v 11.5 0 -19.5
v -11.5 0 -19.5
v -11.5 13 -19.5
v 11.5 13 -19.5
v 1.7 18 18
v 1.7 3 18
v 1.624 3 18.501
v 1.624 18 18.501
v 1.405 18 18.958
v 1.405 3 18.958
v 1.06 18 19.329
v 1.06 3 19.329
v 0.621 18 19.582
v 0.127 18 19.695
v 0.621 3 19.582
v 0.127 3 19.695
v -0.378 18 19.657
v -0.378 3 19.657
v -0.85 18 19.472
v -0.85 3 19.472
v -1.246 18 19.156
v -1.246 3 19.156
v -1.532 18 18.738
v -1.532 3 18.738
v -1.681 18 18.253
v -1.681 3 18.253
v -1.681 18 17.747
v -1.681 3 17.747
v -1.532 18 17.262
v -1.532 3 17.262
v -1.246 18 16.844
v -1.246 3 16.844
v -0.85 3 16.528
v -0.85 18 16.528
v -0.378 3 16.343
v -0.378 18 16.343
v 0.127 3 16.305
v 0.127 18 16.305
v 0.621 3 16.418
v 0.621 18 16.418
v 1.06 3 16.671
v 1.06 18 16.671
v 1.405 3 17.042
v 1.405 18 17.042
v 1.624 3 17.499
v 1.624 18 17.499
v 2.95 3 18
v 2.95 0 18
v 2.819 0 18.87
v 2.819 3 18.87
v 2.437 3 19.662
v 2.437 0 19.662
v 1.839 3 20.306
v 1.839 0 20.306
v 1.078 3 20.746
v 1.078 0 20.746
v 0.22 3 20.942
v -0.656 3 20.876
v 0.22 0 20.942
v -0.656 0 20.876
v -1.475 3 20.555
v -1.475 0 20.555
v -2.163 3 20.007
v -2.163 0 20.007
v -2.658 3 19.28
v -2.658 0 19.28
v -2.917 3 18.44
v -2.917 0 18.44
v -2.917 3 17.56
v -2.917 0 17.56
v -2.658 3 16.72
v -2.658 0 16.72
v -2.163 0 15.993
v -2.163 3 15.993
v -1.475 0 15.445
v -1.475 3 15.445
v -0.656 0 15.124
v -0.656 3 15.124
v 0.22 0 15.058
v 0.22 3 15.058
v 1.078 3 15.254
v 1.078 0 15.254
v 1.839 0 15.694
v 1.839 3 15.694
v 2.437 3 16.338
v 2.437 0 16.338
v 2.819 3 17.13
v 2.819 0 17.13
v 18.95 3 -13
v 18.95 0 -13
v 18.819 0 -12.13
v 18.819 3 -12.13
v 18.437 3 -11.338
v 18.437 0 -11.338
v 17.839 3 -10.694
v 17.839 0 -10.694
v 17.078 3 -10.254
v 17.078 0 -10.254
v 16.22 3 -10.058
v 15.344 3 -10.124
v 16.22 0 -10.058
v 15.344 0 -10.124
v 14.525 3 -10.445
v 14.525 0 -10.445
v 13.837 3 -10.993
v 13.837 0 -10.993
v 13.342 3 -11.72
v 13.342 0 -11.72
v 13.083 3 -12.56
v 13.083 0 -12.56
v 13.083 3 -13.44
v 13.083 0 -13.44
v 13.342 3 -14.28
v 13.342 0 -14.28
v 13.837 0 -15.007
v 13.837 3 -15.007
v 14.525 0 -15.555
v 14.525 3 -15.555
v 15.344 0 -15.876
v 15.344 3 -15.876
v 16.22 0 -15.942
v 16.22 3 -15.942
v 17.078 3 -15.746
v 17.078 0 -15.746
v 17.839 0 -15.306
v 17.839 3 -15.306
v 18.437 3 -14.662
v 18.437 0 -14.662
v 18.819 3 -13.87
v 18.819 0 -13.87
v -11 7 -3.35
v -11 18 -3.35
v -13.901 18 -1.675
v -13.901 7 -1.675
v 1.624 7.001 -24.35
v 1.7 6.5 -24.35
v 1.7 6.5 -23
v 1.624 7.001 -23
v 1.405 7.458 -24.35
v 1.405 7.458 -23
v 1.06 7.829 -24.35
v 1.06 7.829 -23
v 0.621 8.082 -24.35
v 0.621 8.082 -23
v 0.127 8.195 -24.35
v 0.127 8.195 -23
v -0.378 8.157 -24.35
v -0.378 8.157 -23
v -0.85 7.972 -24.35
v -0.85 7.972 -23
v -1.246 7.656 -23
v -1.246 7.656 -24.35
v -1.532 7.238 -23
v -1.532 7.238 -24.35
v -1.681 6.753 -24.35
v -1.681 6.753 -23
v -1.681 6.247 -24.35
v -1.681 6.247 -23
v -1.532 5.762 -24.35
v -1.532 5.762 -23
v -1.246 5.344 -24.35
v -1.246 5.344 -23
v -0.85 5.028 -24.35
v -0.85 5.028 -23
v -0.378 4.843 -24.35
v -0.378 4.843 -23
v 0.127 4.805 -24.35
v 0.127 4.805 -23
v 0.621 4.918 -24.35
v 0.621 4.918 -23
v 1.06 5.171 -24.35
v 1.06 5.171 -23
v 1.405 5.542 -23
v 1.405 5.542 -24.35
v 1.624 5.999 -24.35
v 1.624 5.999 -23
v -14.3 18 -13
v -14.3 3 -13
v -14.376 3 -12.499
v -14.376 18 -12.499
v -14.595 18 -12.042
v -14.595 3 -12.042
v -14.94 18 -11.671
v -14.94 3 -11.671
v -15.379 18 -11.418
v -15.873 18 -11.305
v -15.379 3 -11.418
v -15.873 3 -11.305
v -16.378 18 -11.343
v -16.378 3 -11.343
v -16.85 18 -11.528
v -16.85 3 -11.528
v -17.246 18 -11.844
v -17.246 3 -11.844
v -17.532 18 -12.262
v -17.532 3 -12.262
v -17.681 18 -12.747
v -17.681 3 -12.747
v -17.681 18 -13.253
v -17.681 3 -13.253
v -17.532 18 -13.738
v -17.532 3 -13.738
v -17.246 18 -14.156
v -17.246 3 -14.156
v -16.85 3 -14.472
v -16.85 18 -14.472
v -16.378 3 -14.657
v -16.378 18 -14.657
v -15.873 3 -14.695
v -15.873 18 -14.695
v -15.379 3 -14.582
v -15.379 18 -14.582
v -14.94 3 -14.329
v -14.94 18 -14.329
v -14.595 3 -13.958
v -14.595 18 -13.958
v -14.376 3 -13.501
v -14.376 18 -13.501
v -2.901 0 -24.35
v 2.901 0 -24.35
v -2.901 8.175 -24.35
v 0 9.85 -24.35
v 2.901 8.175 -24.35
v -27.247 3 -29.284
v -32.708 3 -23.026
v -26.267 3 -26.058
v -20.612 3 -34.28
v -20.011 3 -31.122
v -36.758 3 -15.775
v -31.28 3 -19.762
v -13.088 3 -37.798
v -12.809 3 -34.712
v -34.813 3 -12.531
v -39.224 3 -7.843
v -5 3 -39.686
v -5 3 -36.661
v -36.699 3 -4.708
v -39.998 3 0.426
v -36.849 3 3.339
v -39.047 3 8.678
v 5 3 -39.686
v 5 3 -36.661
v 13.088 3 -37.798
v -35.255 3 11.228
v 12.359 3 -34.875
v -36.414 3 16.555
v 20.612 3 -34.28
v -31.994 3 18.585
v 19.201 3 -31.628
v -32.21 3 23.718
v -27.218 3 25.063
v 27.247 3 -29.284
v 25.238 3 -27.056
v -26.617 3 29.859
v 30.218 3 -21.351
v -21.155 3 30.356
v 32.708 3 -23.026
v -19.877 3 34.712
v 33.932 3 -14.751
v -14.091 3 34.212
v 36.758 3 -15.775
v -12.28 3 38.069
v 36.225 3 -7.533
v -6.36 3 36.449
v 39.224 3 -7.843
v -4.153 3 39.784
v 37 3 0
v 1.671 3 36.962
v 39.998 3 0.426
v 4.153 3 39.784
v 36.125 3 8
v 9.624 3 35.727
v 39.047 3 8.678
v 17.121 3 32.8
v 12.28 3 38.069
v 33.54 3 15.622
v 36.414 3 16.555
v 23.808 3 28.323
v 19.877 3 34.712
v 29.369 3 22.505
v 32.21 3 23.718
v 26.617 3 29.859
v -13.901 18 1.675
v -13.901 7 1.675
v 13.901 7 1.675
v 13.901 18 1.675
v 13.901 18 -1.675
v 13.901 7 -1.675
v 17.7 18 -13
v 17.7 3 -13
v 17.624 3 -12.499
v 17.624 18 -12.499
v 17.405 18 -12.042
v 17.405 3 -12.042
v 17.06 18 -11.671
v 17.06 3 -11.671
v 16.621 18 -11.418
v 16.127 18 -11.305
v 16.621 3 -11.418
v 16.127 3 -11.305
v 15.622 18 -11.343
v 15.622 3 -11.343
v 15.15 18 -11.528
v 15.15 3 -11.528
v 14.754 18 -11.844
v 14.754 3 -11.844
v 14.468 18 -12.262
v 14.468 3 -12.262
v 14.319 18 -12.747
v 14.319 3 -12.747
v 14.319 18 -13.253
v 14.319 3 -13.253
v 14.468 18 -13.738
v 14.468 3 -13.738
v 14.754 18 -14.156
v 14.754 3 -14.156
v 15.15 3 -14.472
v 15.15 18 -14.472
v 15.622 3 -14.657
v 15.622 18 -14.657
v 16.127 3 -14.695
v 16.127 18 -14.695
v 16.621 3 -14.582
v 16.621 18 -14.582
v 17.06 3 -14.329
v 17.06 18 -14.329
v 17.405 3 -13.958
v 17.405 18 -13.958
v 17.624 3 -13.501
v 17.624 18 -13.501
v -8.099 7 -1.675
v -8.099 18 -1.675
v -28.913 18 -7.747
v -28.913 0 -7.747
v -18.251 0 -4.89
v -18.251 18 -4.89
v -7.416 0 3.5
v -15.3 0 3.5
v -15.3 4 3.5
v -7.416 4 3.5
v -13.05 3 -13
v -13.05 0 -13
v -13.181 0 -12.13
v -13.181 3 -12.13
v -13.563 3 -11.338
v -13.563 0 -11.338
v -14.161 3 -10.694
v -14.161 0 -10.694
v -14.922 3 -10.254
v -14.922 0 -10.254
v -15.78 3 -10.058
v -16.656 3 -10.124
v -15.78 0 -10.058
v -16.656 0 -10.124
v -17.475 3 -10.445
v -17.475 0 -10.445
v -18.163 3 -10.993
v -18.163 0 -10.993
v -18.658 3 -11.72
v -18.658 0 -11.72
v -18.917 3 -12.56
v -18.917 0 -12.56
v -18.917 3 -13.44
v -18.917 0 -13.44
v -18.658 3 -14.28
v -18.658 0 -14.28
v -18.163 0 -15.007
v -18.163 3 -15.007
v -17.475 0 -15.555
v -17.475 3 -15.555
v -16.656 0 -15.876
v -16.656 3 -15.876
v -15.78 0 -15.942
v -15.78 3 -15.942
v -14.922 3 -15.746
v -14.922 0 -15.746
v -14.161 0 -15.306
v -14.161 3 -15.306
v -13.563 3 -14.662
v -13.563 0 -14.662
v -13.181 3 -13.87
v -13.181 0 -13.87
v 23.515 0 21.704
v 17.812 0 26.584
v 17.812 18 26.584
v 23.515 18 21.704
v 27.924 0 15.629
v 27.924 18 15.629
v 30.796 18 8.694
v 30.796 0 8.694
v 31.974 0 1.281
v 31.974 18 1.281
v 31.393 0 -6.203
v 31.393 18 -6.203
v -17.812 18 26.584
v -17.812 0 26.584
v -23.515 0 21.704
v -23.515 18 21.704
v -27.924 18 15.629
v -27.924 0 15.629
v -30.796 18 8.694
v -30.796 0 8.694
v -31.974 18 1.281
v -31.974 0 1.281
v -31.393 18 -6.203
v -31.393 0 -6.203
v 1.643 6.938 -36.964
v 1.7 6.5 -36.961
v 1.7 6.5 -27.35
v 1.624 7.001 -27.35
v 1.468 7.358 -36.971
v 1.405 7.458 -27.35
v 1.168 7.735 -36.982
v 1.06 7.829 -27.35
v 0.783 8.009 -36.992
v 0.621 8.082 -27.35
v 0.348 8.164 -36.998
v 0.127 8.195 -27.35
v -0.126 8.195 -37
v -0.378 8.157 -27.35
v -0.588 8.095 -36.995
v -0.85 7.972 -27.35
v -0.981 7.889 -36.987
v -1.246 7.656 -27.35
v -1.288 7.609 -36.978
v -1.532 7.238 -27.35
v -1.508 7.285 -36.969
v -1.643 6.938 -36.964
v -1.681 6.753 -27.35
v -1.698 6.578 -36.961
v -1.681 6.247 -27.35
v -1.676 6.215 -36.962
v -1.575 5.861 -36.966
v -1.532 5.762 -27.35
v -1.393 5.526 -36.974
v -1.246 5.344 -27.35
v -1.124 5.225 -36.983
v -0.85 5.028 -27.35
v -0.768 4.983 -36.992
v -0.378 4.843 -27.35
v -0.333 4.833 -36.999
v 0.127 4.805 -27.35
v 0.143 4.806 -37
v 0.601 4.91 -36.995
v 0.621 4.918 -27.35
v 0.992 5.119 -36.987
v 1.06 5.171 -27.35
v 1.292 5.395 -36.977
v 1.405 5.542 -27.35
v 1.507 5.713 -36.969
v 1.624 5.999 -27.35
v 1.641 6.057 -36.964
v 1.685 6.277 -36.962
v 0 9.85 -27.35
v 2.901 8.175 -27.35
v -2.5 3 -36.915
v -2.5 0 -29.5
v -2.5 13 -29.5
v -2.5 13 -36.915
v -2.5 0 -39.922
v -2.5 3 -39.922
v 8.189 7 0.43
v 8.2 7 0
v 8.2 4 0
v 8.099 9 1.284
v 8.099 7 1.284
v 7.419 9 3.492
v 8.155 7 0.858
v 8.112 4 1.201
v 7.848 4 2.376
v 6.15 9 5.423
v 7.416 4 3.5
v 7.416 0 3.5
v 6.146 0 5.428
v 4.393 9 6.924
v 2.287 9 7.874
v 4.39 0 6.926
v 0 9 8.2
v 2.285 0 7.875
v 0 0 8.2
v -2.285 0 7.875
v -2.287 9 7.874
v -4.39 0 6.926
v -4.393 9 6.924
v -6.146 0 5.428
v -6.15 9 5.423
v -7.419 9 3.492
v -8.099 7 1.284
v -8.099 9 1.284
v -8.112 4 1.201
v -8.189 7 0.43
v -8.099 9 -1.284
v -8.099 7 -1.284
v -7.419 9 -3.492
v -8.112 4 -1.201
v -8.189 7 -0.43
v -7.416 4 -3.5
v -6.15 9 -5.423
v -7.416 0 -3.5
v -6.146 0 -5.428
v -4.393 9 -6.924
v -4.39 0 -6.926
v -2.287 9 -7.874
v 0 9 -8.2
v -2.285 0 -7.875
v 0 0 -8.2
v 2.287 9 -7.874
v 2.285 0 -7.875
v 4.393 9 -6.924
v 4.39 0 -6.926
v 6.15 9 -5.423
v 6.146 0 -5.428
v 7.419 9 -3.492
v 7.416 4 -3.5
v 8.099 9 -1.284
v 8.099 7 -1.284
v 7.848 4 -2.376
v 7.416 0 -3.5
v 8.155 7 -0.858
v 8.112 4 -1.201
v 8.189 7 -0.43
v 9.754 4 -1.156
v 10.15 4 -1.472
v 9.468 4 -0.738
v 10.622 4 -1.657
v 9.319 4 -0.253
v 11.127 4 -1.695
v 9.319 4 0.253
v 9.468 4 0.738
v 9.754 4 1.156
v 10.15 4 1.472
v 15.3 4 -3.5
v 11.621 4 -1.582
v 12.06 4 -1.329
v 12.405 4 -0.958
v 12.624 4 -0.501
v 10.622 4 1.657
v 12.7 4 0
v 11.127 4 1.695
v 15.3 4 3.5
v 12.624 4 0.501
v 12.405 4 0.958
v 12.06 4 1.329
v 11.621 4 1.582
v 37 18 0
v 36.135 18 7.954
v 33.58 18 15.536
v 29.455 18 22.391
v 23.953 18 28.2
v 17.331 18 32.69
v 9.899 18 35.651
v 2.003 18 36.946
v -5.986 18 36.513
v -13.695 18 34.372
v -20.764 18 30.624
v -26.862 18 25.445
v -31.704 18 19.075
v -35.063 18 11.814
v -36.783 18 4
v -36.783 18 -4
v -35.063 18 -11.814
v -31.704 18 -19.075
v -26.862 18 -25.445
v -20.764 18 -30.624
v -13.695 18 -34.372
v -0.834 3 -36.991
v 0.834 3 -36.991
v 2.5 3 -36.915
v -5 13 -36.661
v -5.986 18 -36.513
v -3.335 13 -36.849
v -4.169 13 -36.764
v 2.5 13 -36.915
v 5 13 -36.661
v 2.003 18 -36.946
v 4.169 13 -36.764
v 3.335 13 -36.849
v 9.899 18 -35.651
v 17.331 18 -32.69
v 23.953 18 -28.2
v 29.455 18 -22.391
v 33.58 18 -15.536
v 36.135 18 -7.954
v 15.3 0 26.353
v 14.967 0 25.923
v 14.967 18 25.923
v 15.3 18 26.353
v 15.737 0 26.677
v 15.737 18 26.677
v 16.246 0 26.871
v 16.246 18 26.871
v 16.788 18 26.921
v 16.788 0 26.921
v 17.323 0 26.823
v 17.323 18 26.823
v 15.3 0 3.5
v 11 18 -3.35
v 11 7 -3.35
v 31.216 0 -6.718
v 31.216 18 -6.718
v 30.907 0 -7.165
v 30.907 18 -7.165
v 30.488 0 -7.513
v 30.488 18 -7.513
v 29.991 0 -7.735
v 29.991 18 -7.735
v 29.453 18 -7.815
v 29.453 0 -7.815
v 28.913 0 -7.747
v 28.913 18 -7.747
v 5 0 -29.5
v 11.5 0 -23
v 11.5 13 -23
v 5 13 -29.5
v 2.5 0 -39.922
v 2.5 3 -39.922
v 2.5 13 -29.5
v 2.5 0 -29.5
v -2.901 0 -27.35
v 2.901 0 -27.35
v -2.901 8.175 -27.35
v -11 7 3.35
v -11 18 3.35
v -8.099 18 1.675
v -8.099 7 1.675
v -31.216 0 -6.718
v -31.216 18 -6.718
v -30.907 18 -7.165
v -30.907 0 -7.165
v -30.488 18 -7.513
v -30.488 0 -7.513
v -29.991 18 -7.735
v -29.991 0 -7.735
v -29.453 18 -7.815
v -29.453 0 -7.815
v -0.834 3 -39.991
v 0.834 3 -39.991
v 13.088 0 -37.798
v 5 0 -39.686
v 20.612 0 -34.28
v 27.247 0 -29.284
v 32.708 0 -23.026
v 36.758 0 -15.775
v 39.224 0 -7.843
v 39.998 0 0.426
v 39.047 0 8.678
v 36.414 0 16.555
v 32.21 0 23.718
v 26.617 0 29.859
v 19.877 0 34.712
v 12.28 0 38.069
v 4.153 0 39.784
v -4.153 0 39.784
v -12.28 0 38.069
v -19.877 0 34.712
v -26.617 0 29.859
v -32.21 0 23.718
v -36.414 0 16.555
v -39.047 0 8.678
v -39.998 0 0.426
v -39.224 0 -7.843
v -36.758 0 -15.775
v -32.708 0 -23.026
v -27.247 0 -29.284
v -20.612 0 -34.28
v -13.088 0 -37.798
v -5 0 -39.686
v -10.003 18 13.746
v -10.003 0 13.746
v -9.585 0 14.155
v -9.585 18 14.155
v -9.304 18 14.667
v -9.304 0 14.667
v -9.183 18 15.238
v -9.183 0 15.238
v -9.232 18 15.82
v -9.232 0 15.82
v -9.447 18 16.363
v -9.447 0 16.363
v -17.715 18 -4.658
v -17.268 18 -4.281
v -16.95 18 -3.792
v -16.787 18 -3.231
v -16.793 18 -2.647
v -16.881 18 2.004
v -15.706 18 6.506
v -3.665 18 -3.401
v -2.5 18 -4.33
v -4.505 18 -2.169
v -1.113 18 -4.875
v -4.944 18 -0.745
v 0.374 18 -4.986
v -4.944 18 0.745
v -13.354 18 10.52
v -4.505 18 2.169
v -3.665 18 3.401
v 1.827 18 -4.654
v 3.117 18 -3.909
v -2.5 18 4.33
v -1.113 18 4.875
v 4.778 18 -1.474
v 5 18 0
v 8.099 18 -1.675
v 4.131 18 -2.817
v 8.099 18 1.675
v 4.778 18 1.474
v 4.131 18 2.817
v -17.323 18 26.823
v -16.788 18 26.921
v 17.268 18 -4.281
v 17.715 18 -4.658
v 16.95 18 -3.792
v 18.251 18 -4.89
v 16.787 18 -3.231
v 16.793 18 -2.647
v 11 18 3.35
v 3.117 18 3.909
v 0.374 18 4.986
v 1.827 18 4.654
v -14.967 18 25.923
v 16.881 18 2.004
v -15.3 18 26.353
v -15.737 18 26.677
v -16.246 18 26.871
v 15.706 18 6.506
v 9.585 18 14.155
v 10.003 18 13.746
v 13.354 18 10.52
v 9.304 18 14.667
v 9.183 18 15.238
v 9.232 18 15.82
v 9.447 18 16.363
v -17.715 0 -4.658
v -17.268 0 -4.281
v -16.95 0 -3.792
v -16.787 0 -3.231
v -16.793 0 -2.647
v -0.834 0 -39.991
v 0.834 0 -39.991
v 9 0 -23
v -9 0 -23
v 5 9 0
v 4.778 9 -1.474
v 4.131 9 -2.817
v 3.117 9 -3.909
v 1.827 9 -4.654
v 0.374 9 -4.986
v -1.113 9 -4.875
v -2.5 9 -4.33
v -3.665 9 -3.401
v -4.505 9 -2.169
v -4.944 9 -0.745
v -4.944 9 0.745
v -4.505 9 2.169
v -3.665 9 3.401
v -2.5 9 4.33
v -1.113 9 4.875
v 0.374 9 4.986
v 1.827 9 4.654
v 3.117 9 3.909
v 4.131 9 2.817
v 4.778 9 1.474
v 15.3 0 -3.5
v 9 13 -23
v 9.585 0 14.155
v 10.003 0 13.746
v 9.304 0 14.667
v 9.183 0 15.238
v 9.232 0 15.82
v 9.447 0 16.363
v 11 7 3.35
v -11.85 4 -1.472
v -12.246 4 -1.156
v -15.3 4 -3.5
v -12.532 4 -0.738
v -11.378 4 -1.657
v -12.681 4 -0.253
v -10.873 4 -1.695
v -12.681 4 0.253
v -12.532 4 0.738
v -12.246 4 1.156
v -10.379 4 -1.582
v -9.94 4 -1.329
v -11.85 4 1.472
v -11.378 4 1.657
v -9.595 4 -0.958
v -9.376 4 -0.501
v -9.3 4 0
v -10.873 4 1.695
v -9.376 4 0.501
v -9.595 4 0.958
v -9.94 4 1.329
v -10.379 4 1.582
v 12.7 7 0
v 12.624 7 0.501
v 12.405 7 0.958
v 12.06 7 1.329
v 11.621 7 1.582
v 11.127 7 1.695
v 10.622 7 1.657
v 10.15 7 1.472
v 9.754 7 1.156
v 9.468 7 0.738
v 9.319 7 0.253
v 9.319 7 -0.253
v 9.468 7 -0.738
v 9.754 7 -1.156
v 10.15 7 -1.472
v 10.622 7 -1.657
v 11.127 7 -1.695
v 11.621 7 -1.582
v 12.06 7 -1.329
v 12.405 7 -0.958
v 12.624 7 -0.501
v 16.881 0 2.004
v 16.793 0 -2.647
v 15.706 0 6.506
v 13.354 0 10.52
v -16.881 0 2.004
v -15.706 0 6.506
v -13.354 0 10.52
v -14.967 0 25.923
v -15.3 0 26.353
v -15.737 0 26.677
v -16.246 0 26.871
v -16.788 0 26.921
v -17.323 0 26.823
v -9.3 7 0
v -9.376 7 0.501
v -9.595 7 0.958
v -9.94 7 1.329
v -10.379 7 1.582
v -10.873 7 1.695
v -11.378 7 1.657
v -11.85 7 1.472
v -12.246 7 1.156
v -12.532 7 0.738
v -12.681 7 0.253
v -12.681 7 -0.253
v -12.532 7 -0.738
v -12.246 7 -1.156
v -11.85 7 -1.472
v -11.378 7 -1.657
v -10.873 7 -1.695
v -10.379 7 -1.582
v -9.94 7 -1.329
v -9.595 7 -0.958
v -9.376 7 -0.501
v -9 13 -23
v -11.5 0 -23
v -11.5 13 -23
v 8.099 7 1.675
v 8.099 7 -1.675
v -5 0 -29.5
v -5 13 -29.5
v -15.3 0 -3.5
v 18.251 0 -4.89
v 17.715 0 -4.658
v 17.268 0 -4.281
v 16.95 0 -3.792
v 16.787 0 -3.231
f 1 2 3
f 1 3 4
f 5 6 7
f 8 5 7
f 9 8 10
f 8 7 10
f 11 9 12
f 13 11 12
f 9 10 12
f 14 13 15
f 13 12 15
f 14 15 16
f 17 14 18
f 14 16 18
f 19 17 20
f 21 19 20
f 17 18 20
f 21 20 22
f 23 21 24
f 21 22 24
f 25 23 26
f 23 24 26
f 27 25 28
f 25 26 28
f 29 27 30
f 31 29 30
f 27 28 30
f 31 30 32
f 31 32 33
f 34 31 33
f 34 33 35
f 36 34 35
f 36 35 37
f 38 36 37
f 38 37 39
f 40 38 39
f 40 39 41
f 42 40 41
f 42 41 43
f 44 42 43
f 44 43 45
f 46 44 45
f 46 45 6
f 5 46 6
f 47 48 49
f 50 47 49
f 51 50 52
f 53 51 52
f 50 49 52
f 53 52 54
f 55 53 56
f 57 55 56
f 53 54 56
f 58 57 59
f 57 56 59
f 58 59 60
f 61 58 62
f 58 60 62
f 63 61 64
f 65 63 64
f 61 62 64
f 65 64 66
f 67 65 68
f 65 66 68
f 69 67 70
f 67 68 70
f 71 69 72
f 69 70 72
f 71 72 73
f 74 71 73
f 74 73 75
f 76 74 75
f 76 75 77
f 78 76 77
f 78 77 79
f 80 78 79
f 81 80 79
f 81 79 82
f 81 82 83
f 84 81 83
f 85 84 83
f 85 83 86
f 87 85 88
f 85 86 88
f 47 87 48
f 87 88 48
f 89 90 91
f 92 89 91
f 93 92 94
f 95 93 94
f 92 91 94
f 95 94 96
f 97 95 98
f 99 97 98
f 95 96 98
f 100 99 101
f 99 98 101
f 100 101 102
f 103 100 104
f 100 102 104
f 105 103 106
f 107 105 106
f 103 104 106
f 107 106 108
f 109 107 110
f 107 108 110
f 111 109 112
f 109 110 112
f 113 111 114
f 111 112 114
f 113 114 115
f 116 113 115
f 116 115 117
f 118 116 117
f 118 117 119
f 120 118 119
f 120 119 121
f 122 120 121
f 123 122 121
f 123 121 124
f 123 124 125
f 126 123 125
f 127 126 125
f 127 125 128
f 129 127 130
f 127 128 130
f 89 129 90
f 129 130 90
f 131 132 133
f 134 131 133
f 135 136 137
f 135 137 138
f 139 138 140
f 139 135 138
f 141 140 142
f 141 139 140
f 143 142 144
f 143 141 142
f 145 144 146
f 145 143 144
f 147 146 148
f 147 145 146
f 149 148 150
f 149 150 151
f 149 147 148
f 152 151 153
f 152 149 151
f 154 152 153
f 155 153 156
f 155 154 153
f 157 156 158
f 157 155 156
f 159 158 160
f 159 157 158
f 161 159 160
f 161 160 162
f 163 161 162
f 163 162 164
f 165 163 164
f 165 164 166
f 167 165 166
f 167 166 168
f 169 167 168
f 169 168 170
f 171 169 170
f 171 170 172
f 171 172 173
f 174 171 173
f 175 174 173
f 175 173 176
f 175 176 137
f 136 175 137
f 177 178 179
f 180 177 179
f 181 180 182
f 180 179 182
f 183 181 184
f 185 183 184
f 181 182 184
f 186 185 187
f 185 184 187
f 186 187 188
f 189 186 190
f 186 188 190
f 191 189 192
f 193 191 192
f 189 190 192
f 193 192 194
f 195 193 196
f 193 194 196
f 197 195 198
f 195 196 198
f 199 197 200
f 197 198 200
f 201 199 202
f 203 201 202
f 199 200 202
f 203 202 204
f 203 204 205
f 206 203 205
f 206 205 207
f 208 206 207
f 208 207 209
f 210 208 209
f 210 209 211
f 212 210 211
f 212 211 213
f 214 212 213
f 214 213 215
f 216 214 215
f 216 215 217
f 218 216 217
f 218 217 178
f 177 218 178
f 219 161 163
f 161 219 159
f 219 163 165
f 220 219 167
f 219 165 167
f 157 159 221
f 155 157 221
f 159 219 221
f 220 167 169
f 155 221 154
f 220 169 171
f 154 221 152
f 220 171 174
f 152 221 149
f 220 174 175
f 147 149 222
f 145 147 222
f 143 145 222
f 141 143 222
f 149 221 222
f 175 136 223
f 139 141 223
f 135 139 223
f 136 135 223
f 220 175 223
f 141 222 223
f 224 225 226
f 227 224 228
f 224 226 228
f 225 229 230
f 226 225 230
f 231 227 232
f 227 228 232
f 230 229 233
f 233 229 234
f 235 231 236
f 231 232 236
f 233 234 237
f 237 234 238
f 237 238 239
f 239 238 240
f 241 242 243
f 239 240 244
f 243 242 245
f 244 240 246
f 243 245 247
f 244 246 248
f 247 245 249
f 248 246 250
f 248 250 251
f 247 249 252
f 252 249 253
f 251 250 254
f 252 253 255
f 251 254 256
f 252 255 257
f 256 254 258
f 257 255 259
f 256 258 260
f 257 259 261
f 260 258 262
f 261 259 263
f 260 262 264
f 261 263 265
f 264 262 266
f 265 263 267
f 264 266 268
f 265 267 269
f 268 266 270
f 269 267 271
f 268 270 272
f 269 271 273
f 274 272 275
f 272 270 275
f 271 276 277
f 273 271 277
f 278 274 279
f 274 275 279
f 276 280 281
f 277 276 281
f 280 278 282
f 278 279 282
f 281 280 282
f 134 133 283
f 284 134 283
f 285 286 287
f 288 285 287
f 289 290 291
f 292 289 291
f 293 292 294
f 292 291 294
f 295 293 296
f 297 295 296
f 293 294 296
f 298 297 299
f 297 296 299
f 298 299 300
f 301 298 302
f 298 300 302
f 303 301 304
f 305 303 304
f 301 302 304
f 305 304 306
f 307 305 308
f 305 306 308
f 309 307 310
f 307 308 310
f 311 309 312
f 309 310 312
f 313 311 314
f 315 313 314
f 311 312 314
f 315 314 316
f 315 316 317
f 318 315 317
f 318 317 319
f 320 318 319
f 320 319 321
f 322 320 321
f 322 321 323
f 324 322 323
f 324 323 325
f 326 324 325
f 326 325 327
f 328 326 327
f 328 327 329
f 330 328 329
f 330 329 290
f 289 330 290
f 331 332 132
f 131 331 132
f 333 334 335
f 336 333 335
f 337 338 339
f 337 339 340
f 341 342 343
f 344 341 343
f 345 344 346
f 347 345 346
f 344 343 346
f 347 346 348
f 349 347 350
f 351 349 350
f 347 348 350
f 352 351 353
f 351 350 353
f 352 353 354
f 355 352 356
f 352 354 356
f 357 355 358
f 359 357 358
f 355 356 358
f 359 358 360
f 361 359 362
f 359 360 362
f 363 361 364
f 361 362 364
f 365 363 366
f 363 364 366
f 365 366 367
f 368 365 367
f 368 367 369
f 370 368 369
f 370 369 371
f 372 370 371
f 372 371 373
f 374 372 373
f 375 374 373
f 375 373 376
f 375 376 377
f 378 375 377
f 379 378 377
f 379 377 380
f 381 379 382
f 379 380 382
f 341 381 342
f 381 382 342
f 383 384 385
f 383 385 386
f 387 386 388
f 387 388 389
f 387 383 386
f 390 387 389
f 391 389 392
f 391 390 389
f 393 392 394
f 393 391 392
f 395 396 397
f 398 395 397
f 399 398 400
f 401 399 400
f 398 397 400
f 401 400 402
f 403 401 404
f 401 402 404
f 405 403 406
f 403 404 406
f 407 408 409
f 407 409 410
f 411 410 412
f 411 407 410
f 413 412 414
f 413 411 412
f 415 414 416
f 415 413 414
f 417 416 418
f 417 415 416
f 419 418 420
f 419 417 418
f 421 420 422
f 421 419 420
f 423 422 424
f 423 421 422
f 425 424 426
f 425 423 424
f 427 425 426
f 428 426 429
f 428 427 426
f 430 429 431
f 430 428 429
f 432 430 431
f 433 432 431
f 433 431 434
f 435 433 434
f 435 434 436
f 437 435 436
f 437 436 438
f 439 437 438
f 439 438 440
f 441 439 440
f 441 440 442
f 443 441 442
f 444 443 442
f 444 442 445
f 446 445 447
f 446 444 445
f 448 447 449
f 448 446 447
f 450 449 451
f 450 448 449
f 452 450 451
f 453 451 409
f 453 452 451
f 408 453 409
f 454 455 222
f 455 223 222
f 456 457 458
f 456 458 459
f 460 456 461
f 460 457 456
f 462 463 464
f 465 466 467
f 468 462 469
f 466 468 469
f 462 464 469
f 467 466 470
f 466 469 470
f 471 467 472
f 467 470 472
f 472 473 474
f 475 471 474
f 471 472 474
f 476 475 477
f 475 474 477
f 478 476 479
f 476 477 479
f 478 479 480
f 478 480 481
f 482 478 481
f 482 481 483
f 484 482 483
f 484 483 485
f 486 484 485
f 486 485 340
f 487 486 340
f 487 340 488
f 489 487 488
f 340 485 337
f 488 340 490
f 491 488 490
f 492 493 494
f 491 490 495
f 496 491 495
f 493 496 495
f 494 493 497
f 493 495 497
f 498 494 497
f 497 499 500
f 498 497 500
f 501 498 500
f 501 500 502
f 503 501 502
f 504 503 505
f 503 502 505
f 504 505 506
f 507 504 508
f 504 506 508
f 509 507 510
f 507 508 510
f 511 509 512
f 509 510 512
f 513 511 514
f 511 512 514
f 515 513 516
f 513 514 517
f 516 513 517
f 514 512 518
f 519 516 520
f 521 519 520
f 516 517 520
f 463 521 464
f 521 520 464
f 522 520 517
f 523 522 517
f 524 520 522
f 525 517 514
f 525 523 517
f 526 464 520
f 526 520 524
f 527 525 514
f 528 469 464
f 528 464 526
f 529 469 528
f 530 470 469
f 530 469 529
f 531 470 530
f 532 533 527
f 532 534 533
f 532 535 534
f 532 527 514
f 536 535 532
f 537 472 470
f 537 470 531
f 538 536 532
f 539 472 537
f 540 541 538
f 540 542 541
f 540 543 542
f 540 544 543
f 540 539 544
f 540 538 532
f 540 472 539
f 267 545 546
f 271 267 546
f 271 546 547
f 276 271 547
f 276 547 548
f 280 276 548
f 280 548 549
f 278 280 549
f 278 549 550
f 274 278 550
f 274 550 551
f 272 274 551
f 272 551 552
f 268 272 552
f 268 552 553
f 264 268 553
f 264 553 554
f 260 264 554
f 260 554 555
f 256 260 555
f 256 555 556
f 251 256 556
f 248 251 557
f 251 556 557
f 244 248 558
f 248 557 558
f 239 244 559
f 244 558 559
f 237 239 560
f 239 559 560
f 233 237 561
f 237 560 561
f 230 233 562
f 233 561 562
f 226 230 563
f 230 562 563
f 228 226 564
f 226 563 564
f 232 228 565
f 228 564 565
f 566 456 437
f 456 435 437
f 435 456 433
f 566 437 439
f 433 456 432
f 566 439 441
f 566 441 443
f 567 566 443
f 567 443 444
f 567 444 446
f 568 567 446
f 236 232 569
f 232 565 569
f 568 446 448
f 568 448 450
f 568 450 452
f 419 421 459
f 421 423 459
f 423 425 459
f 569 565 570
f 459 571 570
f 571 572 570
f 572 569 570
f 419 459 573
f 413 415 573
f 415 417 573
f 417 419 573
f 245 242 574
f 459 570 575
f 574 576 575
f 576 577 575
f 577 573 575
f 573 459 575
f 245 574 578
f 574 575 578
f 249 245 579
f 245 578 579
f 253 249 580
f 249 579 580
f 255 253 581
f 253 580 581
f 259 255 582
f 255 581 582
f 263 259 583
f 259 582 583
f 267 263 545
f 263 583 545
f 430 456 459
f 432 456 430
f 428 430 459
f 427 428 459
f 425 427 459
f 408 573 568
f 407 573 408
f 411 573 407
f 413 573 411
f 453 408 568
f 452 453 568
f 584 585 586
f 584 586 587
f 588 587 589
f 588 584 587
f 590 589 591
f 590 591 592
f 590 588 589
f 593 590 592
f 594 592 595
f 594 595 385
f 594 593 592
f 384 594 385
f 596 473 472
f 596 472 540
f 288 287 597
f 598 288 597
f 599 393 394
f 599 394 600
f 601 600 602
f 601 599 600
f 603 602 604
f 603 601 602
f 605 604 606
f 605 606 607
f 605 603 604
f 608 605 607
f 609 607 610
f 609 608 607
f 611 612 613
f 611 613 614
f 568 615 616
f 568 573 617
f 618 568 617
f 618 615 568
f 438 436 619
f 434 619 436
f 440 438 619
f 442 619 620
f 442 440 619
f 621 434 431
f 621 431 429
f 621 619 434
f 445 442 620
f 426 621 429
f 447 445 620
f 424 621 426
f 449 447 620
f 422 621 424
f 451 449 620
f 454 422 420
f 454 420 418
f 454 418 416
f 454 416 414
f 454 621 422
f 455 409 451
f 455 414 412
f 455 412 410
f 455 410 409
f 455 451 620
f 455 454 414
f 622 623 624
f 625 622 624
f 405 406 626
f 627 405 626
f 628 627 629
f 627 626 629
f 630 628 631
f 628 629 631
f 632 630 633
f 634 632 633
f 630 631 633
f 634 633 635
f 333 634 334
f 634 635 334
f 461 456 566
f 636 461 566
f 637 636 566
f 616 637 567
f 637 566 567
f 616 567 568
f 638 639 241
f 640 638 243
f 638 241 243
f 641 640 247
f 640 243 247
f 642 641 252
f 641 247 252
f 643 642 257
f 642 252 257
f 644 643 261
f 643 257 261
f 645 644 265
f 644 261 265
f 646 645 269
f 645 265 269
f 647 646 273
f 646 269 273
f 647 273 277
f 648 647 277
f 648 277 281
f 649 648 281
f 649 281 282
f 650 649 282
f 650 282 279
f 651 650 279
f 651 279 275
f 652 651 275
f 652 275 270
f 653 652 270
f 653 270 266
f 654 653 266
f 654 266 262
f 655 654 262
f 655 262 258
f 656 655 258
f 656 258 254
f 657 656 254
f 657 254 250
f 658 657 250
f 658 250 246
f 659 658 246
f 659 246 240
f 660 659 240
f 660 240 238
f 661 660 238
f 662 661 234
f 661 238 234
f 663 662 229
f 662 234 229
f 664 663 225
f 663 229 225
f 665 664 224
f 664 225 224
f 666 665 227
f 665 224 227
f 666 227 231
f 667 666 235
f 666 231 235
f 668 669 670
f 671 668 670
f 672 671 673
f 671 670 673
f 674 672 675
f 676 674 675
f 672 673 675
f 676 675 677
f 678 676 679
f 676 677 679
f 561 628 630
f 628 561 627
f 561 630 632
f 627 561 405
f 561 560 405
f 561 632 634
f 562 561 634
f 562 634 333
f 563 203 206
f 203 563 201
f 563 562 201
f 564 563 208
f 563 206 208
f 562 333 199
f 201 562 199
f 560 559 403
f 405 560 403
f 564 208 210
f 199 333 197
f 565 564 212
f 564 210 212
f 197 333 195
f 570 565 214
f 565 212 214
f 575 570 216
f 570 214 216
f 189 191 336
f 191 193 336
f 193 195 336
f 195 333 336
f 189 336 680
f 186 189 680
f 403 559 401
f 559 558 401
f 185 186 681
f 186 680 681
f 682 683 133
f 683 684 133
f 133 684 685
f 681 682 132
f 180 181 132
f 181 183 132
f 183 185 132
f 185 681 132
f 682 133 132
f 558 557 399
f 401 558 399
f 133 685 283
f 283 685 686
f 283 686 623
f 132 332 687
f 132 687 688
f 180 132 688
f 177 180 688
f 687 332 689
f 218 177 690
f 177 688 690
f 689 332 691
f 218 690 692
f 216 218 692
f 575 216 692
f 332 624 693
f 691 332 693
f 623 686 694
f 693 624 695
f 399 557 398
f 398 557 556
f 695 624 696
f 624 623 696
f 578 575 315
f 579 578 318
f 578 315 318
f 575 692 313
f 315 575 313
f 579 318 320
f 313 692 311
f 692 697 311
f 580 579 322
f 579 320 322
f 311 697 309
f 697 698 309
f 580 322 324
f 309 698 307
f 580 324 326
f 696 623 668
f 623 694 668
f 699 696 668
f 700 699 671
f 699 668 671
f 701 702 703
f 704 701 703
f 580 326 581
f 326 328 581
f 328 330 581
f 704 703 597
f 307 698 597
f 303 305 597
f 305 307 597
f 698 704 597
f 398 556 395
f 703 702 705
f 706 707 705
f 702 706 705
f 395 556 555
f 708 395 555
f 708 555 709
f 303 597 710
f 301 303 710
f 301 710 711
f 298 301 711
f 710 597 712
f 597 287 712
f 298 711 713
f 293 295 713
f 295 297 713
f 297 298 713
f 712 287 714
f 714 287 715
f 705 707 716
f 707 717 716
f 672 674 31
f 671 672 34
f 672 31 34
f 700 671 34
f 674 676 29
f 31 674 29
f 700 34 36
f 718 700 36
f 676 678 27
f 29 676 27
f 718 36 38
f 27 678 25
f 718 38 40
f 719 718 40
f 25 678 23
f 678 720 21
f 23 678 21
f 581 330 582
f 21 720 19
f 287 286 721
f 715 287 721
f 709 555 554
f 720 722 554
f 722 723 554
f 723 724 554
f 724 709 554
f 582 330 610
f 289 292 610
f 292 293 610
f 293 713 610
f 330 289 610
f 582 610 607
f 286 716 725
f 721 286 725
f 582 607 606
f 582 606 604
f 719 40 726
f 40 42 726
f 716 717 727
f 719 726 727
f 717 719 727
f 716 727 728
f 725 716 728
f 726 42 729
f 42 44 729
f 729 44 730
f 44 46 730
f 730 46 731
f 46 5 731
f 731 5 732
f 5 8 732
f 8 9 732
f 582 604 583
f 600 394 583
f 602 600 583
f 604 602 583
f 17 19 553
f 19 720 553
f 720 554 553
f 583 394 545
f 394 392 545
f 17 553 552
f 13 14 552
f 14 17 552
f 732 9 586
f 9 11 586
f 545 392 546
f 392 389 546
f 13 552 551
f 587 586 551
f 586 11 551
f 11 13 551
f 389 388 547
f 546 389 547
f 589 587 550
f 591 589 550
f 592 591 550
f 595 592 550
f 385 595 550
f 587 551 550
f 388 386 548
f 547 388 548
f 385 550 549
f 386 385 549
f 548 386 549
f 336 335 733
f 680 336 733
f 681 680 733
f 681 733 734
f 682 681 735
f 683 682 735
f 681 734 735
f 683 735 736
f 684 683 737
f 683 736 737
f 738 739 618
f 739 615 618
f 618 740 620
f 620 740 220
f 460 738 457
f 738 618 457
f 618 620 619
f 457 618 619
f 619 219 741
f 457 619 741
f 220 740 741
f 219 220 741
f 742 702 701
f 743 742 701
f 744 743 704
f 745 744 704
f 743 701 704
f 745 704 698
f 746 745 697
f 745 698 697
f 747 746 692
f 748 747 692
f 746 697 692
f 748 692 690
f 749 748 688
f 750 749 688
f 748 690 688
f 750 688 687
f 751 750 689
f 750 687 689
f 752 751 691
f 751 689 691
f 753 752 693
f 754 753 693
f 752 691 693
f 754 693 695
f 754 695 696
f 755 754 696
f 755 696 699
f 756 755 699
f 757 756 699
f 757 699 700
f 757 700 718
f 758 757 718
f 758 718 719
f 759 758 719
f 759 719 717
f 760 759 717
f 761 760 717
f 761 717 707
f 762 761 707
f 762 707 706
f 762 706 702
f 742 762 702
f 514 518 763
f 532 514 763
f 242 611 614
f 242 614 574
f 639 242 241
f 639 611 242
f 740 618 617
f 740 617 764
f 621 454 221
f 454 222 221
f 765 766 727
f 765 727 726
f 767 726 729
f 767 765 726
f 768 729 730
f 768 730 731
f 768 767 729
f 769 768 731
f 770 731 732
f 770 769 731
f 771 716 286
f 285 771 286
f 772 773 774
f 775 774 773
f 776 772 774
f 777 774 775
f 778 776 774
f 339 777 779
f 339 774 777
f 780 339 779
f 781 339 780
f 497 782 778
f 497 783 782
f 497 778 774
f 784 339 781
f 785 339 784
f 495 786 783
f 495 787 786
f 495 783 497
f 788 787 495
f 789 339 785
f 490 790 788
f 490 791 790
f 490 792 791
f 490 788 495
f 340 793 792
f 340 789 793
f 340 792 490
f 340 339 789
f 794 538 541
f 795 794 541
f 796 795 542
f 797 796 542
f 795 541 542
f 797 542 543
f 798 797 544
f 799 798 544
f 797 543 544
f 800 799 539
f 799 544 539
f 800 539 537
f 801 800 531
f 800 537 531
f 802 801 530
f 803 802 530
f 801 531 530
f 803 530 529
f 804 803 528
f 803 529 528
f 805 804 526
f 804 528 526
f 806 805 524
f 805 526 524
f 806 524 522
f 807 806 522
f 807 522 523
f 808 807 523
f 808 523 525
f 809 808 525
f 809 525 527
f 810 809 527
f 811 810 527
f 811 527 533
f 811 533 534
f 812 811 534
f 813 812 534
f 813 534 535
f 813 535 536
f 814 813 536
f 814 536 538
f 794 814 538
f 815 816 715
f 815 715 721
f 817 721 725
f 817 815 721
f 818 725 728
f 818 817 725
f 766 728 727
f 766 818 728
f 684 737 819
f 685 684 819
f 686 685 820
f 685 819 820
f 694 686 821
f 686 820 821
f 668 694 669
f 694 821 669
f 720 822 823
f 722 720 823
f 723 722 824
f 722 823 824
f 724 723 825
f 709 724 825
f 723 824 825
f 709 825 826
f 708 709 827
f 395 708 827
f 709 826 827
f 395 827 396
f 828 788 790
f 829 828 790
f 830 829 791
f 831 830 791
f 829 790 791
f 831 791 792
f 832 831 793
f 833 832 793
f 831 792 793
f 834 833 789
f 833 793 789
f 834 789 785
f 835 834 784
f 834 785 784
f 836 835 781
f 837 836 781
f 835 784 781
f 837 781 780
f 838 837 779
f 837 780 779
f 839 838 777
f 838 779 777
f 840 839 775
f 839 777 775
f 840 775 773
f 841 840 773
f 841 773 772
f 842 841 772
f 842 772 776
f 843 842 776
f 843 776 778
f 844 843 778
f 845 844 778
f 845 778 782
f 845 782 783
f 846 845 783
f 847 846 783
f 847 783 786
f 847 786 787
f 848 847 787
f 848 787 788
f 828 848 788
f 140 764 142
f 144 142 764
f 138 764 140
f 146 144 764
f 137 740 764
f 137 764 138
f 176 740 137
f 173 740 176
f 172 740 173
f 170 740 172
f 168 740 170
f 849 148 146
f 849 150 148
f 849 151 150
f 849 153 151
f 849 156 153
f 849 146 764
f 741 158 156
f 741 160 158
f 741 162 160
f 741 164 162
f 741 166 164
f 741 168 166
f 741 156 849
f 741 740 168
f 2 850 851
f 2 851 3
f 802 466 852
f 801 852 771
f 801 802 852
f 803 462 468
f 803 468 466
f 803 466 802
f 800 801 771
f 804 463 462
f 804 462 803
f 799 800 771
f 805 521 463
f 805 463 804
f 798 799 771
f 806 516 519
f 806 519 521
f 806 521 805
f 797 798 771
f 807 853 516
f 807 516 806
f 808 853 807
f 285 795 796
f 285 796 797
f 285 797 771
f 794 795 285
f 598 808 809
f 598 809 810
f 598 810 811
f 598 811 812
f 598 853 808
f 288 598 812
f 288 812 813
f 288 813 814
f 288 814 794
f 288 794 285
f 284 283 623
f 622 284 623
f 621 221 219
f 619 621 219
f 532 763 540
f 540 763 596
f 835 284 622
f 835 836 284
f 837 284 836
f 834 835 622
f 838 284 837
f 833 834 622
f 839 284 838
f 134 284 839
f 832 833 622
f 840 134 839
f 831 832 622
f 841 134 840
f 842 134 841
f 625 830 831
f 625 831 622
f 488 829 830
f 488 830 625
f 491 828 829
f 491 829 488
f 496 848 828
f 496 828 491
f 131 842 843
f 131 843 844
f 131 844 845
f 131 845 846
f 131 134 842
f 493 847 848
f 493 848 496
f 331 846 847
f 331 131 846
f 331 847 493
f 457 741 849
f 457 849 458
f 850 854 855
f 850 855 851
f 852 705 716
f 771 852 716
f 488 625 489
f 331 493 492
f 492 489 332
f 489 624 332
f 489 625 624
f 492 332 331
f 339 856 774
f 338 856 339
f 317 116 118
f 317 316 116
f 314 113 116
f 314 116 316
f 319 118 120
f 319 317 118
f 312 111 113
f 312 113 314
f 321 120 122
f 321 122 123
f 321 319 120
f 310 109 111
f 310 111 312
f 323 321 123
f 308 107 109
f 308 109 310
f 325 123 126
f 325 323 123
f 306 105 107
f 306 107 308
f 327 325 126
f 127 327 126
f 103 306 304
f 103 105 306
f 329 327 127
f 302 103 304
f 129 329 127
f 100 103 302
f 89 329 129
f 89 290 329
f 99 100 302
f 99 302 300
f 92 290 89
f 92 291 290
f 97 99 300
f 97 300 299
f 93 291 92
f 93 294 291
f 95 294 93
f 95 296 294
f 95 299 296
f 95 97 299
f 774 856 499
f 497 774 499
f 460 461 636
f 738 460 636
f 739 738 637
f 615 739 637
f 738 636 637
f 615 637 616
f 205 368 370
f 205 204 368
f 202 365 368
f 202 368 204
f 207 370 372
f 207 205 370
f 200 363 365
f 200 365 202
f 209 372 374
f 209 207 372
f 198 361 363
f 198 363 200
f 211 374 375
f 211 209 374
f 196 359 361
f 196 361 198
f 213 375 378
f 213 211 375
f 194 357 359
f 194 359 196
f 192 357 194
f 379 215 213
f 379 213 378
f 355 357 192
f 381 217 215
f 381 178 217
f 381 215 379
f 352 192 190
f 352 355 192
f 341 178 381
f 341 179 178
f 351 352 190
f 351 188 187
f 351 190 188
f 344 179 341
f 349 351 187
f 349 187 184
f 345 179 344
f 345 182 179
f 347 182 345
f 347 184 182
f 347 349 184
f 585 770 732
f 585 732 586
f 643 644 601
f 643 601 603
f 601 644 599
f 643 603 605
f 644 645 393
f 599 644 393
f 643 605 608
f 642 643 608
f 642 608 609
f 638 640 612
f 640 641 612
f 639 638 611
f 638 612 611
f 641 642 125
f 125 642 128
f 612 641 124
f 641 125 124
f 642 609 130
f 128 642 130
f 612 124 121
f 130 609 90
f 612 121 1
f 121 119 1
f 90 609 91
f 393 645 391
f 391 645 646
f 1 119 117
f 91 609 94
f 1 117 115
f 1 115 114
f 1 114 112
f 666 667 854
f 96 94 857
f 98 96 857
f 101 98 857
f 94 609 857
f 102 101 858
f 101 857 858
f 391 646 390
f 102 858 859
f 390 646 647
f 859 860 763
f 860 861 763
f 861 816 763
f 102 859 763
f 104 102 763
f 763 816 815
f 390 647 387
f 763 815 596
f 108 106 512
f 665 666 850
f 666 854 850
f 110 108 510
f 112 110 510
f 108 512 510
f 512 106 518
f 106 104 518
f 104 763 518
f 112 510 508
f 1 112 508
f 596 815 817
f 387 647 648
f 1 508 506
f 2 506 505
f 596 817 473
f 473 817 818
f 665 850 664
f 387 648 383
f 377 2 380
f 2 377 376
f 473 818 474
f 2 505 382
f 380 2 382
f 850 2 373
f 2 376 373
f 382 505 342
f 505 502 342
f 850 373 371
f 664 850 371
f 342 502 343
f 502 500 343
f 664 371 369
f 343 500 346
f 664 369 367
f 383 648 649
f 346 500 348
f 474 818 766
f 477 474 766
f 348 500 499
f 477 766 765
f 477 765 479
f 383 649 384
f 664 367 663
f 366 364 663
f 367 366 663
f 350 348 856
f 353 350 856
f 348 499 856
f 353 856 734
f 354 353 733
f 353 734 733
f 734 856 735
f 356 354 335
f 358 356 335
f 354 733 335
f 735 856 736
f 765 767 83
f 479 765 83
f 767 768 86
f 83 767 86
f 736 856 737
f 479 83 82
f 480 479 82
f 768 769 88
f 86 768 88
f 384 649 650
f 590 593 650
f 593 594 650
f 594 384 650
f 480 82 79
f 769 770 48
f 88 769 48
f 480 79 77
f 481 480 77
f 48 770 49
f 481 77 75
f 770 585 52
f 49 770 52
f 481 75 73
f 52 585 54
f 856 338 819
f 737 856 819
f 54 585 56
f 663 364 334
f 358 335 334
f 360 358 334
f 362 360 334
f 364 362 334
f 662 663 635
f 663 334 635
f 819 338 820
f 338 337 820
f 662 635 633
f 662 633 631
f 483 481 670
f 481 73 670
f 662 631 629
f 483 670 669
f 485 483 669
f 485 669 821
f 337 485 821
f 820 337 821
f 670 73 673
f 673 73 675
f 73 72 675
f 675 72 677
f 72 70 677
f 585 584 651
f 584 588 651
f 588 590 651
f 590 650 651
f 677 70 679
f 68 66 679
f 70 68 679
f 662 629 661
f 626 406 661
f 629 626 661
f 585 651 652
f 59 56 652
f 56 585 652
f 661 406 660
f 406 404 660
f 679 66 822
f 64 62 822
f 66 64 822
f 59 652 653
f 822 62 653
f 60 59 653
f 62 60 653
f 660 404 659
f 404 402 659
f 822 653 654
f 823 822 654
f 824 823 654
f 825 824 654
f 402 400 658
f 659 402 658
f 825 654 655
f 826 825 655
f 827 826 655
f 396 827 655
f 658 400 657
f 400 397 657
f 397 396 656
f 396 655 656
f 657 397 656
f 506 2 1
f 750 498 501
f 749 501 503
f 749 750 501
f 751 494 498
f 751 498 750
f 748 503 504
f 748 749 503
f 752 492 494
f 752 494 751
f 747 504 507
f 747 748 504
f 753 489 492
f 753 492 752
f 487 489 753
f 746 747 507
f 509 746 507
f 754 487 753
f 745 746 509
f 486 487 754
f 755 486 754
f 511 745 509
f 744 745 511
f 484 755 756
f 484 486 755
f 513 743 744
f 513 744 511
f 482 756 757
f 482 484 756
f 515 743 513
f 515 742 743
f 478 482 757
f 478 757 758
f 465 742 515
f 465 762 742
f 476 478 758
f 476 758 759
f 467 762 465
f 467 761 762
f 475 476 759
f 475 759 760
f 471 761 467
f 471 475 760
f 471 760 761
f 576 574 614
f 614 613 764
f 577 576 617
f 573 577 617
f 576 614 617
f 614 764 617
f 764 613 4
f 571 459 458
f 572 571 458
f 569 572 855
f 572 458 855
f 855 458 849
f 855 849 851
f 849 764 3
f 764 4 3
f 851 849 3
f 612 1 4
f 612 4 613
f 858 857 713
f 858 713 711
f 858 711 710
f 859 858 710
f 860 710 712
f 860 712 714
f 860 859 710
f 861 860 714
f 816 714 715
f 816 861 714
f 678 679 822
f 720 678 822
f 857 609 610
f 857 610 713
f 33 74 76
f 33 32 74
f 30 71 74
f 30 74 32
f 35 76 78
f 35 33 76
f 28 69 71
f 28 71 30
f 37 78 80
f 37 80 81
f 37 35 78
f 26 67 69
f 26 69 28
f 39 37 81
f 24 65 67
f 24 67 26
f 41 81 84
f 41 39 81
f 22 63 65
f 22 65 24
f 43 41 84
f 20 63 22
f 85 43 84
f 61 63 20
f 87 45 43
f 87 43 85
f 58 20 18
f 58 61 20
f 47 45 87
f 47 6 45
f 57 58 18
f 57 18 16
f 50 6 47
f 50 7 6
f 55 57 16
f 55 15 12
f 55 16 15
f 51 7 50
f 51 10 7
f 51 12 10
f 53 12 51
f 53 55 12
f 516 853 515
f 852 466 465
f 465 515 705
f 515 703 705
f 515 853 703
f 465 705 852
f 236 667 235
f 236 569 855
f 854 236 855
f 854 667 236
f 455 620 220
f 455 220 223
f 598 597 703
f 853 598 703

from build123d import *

# Parameters (mm, degrees)
CORTAR_EXTRUIR1_DEPTH      = 13
CROQUIS3_R                 = 1.7
CORTAR_EXTRUIR2_DEPTH      = 17
CORTAR_EXTRUIR3_DEPTH      = 1.5
CORTAR_EXTRUIR3_DEPTH_BACK = 1.5
CROQUIS5_R                 = 5
CORTAR_EXTRUIR4_DEPTH      = 18
CROQUIS6_R                 = 8.2
CORTAR_EXTRUIR5_DEPTH      = 9
CROQUIS7_W                 = 30.6
CROQUIS7_H                 = 7
CORTAR_EXTRUIR6_DEPTH      = 4
CROQUIS8_R                 = 1.7
CORTAR_EXTRUIR7_DEPTH      = 14
CORTAR_EXTRUIR8_DEPTH      = 11
CORTAR_EXTRUIR9_DEPTH      = 18
CROQUIS11_R                = 1.7
CORTAR_EXTRUIR10_DEPTH     = 18
CROQUIS12_R                = 2.95
CORTAR_EXTRUIR11_DEPTH     = 3


with BuildPart() as part:
    # Croquis1 → Revolución1 (revolve)
    with BuildSketch(Plane.XY):
        Polygon((0, 0), (40, 0), (40, 3), (37, 3), (37, 18), (0, 18), align=None)
    revolve(axis=Axis((0, 18, 0), (0, -1, 0)))

    # Croquis2 → Cortar-Extruir1 (cut)
    with BuildSketch(Plane.XZ):
        Polygon((-11.5, -19.5), (11.5, -19.5), (11.5, -23), (5, -29.5), (5, -54.5), (2.5, -54.5), (2.5, -29.5), (9, -23), (-9, -23), (-2.5, -29.5), (-2.5, -54.5), (-5, -54.5), (-5, -29.5), (-11.5, -23), align=None)
    extrude(amount=-CORTAR_EXTRUIR1_DEPTH, mode=Mode.SUBTRACT)

    # Croquis3 → Cortar-Extruir2 (cut)
    with BuildSketch(Plane.XY.offset(-40)):
        with Locations((0, 6.5)):
            Circle(CROQUIS3_R)
    extrude(amount=CORTAR_EXTRUIR2_DEPTH, mode=Mode.SUBTRACT)

    # Croquis4 → Cortar-Extruir3 (cut, two sides)
    with BuildSketch(Plane.XY.offset(-25.85)) as cortar_extruir3_sk:
        Polygon((0, 9.85), (-2.901185103, 8.175), (-2.901185103, 4.825), (-2.901185103, -1.825), (2.901185103, -1.825), (2.901185103, 4.825), (2.901185103, 8.175), align=None)
    extrude(amount=CORTAR_EXTRUIR3_DEPTH, mode=Mode.SUBTRACT)
    extrude(cortar_extruir3_sk.sketch, amount=-CORTAR_EXTRUIR3_DEPTH_BACK, mode=Mode.SUBTRACT)

    # Croquis5 → Cortar-Extruir4 (cut)
    with BuildSketch(Plane(origin=(0, 18, 0), x_dir=(1, 0, 0), z_dir=(0, 1, 0))):
        Circle(CROQUIS5_R)
    extrude(amount=-CORTAR_EXTRUIR4_DEPTH, mode=Mode.SUBTRACT)

    # Croquis6 → Cortar-Extruir5 (cut)
    with BuildSketch(Plane.XZ):
        Circle(CROQUIS6_R)
    extrude(amount=-CORTAR_EXTRUIR5_DEPTH, mode=Mode.SUBTRACT)

    # Croquis7 → Cortar-Extruir6 (cut)
    with BuildSketch(Plane.XZ):
        Rectangle(CROQUIS7_W, CROQUIS7_H)
    extrude(amount=-CORTAR_EXTRUIR6_DEPTH, mode=Mode.SUBTRACT)

    # Croquis8 → Cortar-Extruir7 (cut)
    with BuildSketch(Plane.XZ.offset(-4)):
        with Locations((-11, 0)):
            Circle(CROQUIS8_R)
        with Locations((11, 0)):
            Circle(CROQUIS8_R)
    extrude(amount=-CORTAR_EXTRUIR7_DEPTH, mode=Mode.SUBTRACT)

    # Croquis9 → Cortar-Extruir8 (cut)
    with BuildSketch(Plane(origin=(0, 18, 0), x_dir=(1, 0, 0), z_dir=(0, 1, 0))):
        Polygon((-11, 3.35), (-13.901185103, 1.675), (-13.901185103, -1.675), (-11, -3.35), (-8.098814897, -1.675), (-8.098814897, 1.675), align=None)
        Polygon((11, 3.35), (8.098814897, 1.675), (8.098814897, -1.675), (11, -3.35), (13.901185103, -1.675), (13.901185103, 1.675), align=None)
    extrude(amount=-CORTAR_EXTRUIR8_DEPTH, mode=Mode.SUBTRACT)

    # Croquis10 → Cortar-Extruir9 (cut)
    with BuildSketch(Plane.XZ):
        with BuildLine():
            Line((9.447221814, 16.363068172), (14.966629547, 25.922962794))
            ThreePointArc((14.966629547, 25.922962794), (16.245761141, 26.871003909), (17.811925712, 26.584493647))
            ThreePointArc((17.811925712, 26.584493647), (29.56414504, 12.245869836), (31.393009189, -6.203142275))
            ThreePointArc((31.393009189, -6.203142275), (30.48815695, -7.513181213), (28.913308024, -7.747297536))
            Line((28.913308024, -7.747297536), (18.250631073, -4.890241857))
            ThreePointArc((18.250631073, -4.890241857), (17.091330505, -4.048287785), (16.792661883, -2.64698071))
            ThreePointArc((16.792661883, -2.64698071), (15.705952053, 6.50561835), (10.002507082, 13.745903101))
            ThreePointArc((10.002507082, 13.745903101), (9.222823954, 14.947967445), (9.447221814, 16.363068172))
        make_face()
    cortar_extruir9 = extrude(amount=-CORTAR_EXTRUIR9_DEPTH, mode=Mode.SUBTRACT)

    # Simetría1: Cortar-Extruir9 across plane
    add(cortar_extruir9.mirror(Plane(origin=(0, 0, 0), x_dir=(0, 0, 1), z_dir=(1, 0, 0))), mode=Mode.SUBTRACT)

    # Croquis11 → Cortar-Extruir10 (cut)
    with BuildSketch(Plane.XZ):
        with Locations((-16, -13)):
            Circle(CROQUIS11_R)
        with Locations((16, -13)):
            Circle(CROQUIS11_R)
        with Locations((0, 18)):
            Circle(CROQUIS11_R)
    extrude(amount=-CORTAR_EXTRUIR10_DEPTH, mode=Mode.SUBTRACT)

    # Croquis12 → Cortar-Extruir11 (cut)
    with BuildSketch(Plane.XZ):
        with Locations((-16, -13)):
            Circle(CROQUIS12_R)
        with Locations((16, -13)):
            Circle(CROQUIS12_R)
        with Locations((0, 18)):
            Circle(CROQUIS12_R)
    extrude(amount=-CORTAR_EXTRUIR11_DEPTH, mode=Mode.SUBTRACT)


solid = part.part
